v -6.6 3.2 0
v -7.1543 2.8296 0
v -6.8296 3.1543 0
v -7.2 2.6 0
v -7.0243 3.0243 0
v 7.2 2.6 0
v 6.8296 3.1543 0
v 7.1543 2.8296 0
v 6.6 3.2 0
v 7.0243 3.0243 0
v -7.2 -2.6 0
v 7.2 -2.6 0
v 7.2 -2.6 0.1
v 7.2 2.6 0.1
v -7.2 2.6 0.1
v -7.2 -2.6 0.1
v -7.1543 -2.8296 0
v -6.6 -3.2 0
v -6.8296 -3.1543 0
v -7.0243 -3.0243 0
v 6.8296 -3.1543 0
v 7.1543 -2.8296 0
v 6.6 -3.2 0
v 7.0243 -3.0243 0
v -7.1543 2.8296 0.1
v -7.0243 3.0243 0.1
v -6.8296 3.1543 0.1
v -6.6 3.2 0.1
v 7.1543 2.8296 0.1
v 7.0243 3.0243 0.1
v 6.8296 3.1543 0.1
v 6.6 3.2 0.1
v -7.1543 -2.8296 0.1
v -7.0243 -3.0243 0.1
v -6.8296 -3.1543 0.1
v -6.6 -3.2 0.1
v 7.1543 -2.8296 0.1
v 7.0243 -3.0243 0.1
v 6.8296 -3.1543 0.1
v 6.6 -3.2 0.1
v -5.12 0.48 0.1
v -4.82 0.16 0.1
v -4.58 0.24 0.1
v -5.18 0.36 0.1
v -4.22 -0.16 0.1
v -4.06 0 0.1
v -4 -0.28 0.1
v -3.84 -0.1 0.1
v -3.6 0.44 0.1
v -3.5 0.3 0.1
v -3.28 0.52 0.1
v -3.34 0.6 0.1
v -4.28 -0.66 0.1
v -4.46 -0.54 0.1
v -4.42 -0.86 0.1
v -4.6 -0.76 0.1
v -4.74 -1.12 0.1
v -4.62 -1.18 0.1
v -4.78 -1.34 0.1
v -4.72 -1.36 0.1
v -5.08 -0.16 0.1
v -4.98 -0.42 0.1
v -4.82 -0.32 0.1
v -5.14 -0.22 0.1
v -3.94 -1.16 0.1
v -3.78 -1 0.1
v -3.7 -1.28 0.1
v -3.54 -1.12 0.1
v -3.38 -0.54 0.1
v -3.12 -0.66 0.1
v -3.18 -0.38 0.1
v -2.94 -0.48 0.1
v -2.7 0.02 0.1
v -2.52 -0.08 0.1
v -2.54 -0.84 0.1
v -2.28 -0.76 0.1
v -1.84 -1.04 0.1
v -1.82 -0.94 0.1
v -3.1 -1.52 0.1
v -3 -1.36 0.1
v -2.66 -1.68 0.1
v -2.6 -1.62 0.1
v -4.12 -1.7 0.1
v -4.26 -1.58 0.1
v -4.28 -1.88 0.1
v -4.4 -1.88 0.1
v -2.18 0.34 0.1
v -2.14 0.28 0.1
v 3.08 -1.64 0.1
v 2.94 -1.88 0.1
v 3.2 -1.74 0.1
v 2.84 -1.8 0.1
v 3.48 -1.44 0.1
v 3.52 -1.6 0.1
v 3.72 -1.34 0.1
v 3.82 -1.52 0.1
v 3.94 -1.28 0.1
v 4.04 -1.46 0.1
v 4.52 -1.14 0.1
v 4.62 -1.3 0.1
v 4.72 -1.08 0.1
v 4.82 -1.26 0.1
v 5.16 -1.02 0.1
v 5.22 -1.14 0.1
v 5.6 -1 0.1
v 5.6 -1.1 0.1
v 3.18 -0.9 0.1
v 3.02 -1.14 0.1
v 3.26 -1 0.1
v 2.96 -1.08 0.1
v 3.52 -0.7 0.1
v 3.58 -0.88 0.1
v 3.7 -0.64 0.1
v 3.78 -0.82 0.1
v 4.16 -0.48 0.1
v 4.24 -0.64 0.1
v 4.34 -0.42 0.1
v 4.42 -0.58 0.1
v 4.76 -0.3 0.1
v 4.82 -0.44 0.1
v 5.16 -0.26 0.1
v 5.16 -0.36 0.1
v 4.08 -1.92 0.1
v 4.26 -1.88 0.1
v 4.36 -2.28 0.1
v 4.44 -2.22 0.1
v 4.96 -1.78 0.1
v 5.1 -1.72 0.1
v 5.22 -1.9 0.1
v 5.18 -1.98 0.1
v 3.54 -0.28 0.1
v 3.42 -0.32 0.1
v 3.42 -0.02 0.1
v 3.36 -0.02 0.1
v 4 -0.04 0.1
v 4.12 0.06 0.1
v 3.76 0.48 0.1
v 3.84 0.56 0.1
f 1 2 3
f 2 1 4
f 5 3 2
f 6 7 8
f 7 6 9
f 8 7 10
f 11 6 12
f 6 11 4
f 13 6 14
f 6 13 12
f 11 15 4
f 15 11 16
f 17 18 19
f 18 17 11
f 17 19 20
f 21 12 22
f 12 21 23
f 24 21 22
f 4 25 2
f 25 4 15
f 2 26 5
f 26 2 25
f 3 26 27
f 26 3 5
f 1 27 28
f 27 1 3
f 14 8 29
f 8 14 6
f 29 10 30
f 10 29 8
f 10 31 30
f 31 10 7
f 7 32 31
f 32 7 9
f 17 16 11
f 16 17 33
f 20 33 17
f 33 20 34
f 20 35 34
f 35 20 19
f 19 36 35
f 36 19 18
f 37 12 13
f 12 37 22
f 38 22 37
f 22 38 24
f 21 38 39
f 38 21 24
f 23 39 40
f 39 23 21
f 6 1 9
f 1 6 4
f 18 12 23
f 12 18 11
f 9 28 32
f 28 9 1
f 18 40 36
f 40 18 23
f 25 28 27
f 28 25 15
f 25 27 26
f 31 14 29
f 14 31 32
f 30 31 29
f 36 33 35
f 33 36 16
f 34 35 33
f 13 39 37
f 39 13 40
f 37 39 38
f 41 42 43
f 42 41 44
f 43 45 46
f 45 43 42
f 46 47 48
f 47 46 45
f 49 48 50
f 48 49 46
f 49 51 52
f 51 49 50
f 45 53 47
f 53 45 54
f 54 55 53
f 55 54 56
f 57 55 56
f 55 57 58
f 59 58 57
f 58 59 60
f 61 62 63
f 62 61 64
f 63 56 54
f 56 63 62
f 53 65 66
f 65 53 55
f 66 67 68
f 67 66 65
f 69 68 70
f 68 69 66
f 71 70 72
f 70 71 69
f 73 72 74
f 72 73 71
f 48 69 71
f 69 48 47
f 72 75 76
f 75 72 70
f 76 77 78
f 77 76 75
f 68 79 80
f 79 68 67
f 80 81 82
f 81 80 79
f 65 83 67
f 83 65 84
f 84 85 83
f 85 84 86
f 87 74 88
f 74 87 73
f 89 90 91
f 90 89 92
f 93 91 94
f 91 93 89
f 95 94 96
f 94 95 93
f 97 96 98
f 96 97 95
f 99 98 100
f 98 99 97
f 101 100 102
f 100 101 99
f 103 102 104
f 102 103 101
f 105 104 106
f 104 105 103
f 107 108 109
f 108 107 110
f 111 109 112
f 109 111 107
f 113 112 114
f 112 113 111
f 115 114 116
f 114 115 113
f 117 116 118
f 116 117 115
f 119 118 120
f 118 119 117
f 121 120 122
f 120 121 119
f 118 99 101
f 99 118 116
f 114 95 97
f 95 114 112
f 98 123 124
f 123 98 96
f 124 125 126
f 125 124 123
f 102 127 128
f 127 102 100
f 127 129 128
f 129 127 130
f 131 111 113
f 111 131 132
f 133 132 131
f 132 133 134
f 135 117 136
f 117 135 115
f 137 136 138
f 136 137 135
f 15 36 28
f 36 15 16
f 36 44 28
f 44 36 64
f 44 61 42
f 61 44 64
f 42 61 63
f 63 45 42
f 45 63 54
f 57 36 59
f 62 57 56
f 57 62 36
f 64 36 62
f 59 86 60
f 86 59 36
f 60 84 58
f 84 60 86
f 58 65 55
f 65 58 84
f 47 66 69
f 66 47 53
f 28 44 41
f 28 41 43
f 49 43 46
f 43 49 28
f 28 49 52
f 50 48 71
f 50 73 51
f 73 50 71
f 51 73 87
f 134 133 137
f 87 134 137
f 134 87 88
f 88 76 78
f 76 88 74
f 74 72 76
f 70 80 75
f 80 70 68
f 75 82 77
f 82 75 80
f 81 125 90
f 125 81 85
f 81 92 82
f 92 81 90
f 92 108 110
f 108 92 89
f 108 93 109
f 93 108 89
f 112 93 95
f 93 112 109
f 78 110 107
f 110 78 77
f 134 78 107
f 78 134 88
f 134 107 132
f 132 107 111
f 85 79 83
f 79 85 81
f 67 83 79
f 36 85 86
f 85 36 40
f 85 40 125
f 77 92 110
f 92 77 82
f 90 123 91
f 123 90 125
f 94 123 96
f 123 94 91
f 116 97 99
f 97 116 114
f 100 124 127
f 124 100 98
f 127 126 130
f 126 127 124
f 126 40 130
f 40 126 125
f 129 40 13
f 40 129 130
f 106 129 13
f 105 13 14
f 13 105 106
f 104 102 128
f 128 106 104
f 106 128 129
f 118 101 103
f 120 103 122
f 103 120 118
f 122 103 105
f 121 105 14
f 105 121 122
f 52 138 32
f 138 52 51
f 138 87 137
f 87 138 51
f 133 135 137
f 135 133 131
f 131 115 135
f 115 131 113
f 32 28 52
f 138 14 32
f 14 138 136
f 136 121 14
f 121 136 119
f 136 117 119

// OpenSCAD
// file: ../p/box3u12.scad
use <../lib.scad>
function ldraw_lib__box3u12() = [
// 0 Box with 3 Parallel Faces without Any Edges
// 0 Name: box3u12.dat
// 0 Author: J.C. Tchang [tchang]
// 0 !LDRAW_ORG Primitive UPDATE 2014-02
// 0 !LICENSE Licensed under CC BY 4.0 : see CAreadme.txt
// 
// 0 BFC CERTIFY CCW
  [0,"BFC","CERTIFY"],
  [0,"BFC","CCW"],
// 
// 0 !HISTORY 2014-12-23 [PTadmin] Official Update 2014-02
// 
// 
// 4 16 -1 1 1 1 1 1 1 1 -1 -1 1 -1
  [4,16,-1,1,1,1,1,1,1,1,-1,-1,1,-1],
// 4 16 -1 1 1 -1 0 1 1 0 1 1 1 1
  [4,16,-1,1,1,-1,0,1,1,0,1,1,1,1],
// 4 16 1 1 -1 1 0 -1 -1 0 -1 -1 1 -1
  [4,16,1,1,-1,1,0,-1,-1,0,-1,-1,1,-1],
];
module ldraw_lib__box3u12(step=0, col=false, unit=2/5, alt=false, line=0.2, solid=!$preview)
    makepoly(ldraw_lib__box3u12(), step=step, col=col, unit=unit, alt=alt, line=line, solid=solid);
ldraw_lib__box3u12(line=0.2);
// file: ../p/1-4cyli.scad
use <../lib.scad>
function ldraw_lib__1_4cyli() = [
// 0 Cylinder 0.25
// 0 Name: 1-4cyli.dat
// 0 Author: James Jessiman
// 0 !LDRAW_ORG Primitive UPDATE 2012-01
// 0 !LICENSE Licensed under CC BY 4.0 : see CAreadme.txt
// 
// 0 BFC CERTIFY CCW
  [0,"BFC","CERTIFY"],
  [0,"BFC","CCW"],
// 
// 0 !HISTORY 2002-03-23 [sbliss] Added BFC statement.
// 0 !HISTORY 2002-04-25 [PTadmin] Official Update 2002-02
// 0 !HISTORY 2007-06-22 [PTadmin] Header formatted for Contributor Agreement
// 0 !HISTORY 2008-07-01 [PTadmin] Official Update 2008-01
// 0 !HISTORY 2012-02-16 [Philo] Changed to CCW
// 0 !HISTORY 2012-03-30 [PTadmin] Official Update 2012-01
// 
// 
// 4 16 1 1 0 0.9239 1 0.3827 0.9239 0 0.3827 1 0 0
  [4,16,1,1,0,0.9239,1,0.3827,0.9239,0,0.3827,1,0,0],
// 5 24 1 0 0 1 1 0 0.9239 0 0.3827 1 0 -1
  [5,24,1,0,0,1,1,0,0.9239,0,0.3827,1,0,-1],
// 4 16 0.9239 1 0.3827 0.7071 1 0.7071 0.7071 0 0.7071 0.9239 0 0.3827
  [4,16,0.9239,1,0.3827,0.7071,1,0.7071,0.7071,0,0.7071,0.9239,0,0.3827],
// 5 24 0.9239 0 0.3827 0.9239 1 0.3827 0.7071 0 0.7071 1 0 0
  [5,24,0.9239,0,0.3827,0.9239,1,0.3827,0.7071,0,0.7071,1,0,0],
// 4 16 0.7071 1 0.7071 0.3827 1 0.9239 0.3827 0 0.9239 0.7071 0 0.7071
  [4,16,0.7071,1,0.7071,0.3827,1,0.9239,0.3827,0,0.9239,0.7071,0,0.7071],
// 5 24 0.7071 0 0.7071 0.7071 1 0.7071 0.3827 0 0.9239 0.9239 0 0.3827
  [5,24,0.7071,0,0.7071,0.7071,1,0.7071,0.3827,0,0.9239,0.9239,0,0.3827],
// 4 16 0.3827 1 0.9239 0 1 1 0 0 1 0.3827 0 0.9239
  [4,16,0.3827,1,0.9239,0,1,1,0,0,1,0.3827,0,0.9239],
// 5 24 0.3827 0 0.9239 0.3827 1 0.9239 0 0 1 0.7071 0 0.7071
  [5,24,0.3827,0,0.9239,0.3827,1,0.9239,0,0,1,0.7071,0,0.7071],
// 5 24 0 0 1 0 1 1 0.3827 0 0.9239 -1 0 1
  [5,24,0,0,1,0,1,1,0.3827,0,0.9239,-1,0,1],
];
module ldraw_lib__1_4cyli(step=0, col=false, unit=2/5, alt=false, line=0.2, solid=!$preview)
    makepoly(ldraw_lib__1_4cyli(), step=step, col=col, unit=unit, alt=alt, line=line, solid=solid);
ldraw_lib__1_4cyli(line=0.2);
// file: s/stickerback008x018.scad
use <../../lib.scad>
use <../../p/1-4chrd.scad>
use <../../p/1-4cyli.scad>
use <../../p/box3u12.scad>
function ldraw_lib__s__stickerback008x018() = [
// 0 ~Sticker Back  0.8 x  1.8
// 0 Name: s\stickerback008x018.dat
// 0 Author: Massimo Maso [Sirio]
// 0 !LDRAW_ORG Subpart UPDATE 2025-08
// 0 !LICENSE Licensed under CC BY 4.0 : see CAreadme.txt
// 
// 0 BFC CERTIFY CCW
  [0,"BFC","CERTIFY"],
  [0,"BFC","CCW"],
// 
// 0 !HISTORY 2025-08-31 [OrionP] Official Update 2025-08
// 
// 0 // Primitives
// 1 16 -16.5 0 6.5 -1.5 0 0 0 -1 0 0 0 1.5 1-4chrd.dat
  [1,16,-16.5,0,6.5,-1.5,0,0,0,-1,0,0,0,1.5, ldraw_lib__1_4chrd()],
// 1 16 16.5 0 6.5 1.5 0 0 0 -1 0 0 0 1.5 1-4chrd.dat
  [1,16,16.5,0,6.5,1.5,0,0,0,-1,0,0,0,1.5, ldraw_lib__1_4chrd()],
// 1 16 0 -.25 0 0 0 18 0 .25 0 6.5 0 0 box3u12.dat
  [1,16,0,-.25,0,0,0,18,0,.25,0,6.5,0,0, ldraw_lib__box3u12()],
// 1 16 -16.5 0 -6.5 -1.5 0 0 0 -1 0 0 0 -1.5 1-4chrd.dat
  [1,16,-16.5,0,-6.5,-1.5,0,0,0,-1,0,0,0,-1.5, ldraw_lib__1_4chrd()],
// 1 16 16.5 0 -6.5 1.5 0 0 0 -1 0 0 0 -1.5 1-4chrd.dat
  [1,16,16.5,0,-6.5,1.5,0,0,0,-1,0,0,0,-1.5, ldraw_lib__1_4chrd()],
// 1 16 -16.5 0 6.5 -1.5 0 0 0 -.25 0 0 0 1.5 1-4cyli.dat
  [1,16,-16.5,0,6.5,-1.5,0,0,0,-.25,0,0,0,1.5, ldraw_lib__1_4cyli()],
// 1 16 16.5 0 6.5 1.5 0 0 0 -.25 0 0 0 1.5 1-4cyli.dat
  [1,16,16.5,0,6.5,1.5,0,0,0,-.25,0,0,0,1.5, ldraw_lib__1_4cyli()],
// 1 16 -16.5 0 -6.5 -1.5 0 0 0 -.25 0 0 0 -1.5 1-4cyli.dat
  [1,16,-16.5,0,-6.5,-1.5,0,0,0,-.25,0,0,0,-1.5, ldraw_lib__1_4cyli()],
// 1 16 16.5 0 -6.5 1.5 0 0 0 -.25 0 0 0 -1.5 1-4cyli.dat
  [1,16,16.5,0,-6.5,1.5,0,0,0,-.25,0,0,0,-1.5, ldraw_lib__1_4cyli()],
// 0 // Bottom face
// 4 16 -18 0 6.5 -16.5 0 8 16.5 0 8 18 0 6.5
  [4,16,-18,0,6.5,-16.5,0,8,16.5,0,8,18,0,6.5],
// 4 16 -18 0 -6.5 18 0 -6.5 16.5 0 -8 -16.5 0 -8
  [4,16,-18,0,-6.5,18,0,-6.5,16.5,0,-8,-16.5,0,-8],
// 0 // Lateral face
// 4 16 -16.5 0 8 -16.5 -.25 8 16.5 -.25 8 16.5 0 8
  [4,16,-16.5,0,8,-16.5,-.25,8,16.5,-.25,8,16.5,0,8],
// 4 16 -16.5 0 -8 16.5 0 -8 16.5 -.25 -8 -16.5 -.25 -8
  [4,16,-16.5,0,-8,16.5,0,-8,16.5,-.25,-8,-16.5,-.25,-8],
];
module ldraw_lib__s__stickerback008x018(step=0, col=false, unit=2/5, alt=false, line=0.2, solid=!$preview)
    makepoly(ldraw_lib__s__stickerback008x018(), step=step, col=col, unit=unit, alt=alt, line=line, solid=solid);
ldraw_lib__s__stickerback008x018(line=0.2);
// file: ../p/1-4chrd.scad
use <../lib.scad>
function ldraw_lib__1_4chrd() = [
// 0 Chord 0.25
// 0 Name: 1-4chrd.dat
// 0 Author: Max Martin Richter [MMR1988]
// 0 !LDRAW_ORG Primitive UPDATE 2023-05
// 0 !LICENSE Licensed under CC BY 4.0 : see CAreadme.txt
// 
// 0 BFC CERTIFY CCW
  [0,"BFC","CERTIFY"],
  [0,"BFC","CCW"],
// 
// 0 !HISTORY 2004-04-22 [PTadmin] Official Update 2004-02
// 0 !HISTORY 2007-10-09 [PTadmin] Header formatted for Contributor Agreement
// 0 !HISTORY 2008-07-01 [PTadmin] Official Update 2008-01
// 0 !HISTORY 2012-08-02 [MMR1988] Re-creation with PrimGen2 and Rectifier
// 0 !HISTORY 2012-08-09 [PTadmin] Official Update 2012-02
// 0 !HISTORY 2023-10-27 [OrionP] Change author to MMR1988 from hafhead
// 0 !HISTORY 2023-10-31 [OrionP] Official Update 2023-05
// 
// 4 16 0.9239 0 0.3827 0.3827 0 0.9239 0 0 1 1 0 0
  [4,16,0.9239,0,0.3827,0.3827,0,0.9239,0,0,1,1,0,0],
// 3 16 0.7071 0 0.7071 0.3827 0 0.9239 0.9239 0 0.3827
  [3,16,0.7071,0,0.7071,0.3827,0,0.9239,0.9239,0,0.3827],
];
module ldraw_lib__1_4chrd(step=0, col=false, unit=2/5, alt=false, line=0.2, solid=!$preview)
    makepoly(ldraw_lib__1_4chrd(), step=step, col=col, unit=unit, alt=alt, line=line, solid=solid);
ldraw_lib__1_4chrd(line=0.2);
// main file
use <../lib.scad>
use <../p/1-4chrd.scad>
use <s/stickerback008x018.scad>
function ldraw_lib__6196575g() = [
// 0 Sticker  0.8 x  1.8 with Two Black Hashes on Tan Background
// 0 Name: 6196575g.dat
// 0 Author: Evert-Jan Boer [ejboer]
// 0 !LDRAW_ORG Part UPDATE 2026-09
// 0 !LICENSE Licensed under CC BY 4.0 : see CAreadme.txt
// 
// 0 BFC CERTIFY CCW
  [0,"BFC","CERTIFY"],
  [0,"BFC","CCW"],
// 
// 0 !CATEGORY Sticker
// 0 !KEYWORDS Bricklink 10258stk01, Brickowl 992817, London Bus, Rebrickable 34561
// 0 !KEYWORDS set 10258
// 
// 0 !HISTORY 2024-09-30 [OrionP] Official Update 2024-08
// 0 !HISTORY 2026-06-07 [Sirio] Introduced stickerback; changed description; adapted top face
// 0 !HISTORY 2026-09-30 [OrionP] Official Update 2026-09
// 
// 0 // Stickerback
// 1 16 0 0 0 1 0 0 0 1 0 0 0 1 s\stickerback008x018.dat
  [1,16,0,0,0,1,0,0,0,1,0,0,0,1, ldraw_lib__s__stickerback008x018()],
// 0 // Primitives
// 1 19 -16.5 -.25 6.5 -1.5 0 0 0 1 0 0 0 1.5 1-4chrd.dat
  [1,19,-16.5,-.25,6.5,-1.5,0,0,0,1,0,0,0,1.5, ldraw_lib__1_4chrd()],
// 1 19 16.5 -.25 6.5 1.5 0 0 0 1 0 0 0 1.5 1-4chrd.dat
  [1,19,16.5,-.25,6.5,1.5,0,0,0,1,0,0,0,1.5, ldraw_lib__1_4chrd()],
// 1 19 -16.5 -.25 -6.5 -1.5 0 0 0 1 0 0 0 -1.5 1-4chrd.dat
  [1,19,-16.5,-.25,-6.5,-1.5,0,0,0,1,0,0,0,-1.5, ldraw_lib__1_4chrd()],
// 1 19 16.5 -.25 -6.5 1.5 0 0 0 1 0 0 0 -1.5 1-4chrd.dat
  [1,19,16.5,-.25,-6.5,1.5,0,0,0,1,0,0,0,-1.5, ldraw_lib__1_4chrd()],
// 0 // Top face
// 0 // Black faces
// 4 0 -12.95 -.25 .9 -12.05 -.25 .4 -11.45 -.25 .6 -12.8 -.25 1.2
  [4,0,-12.95,-.25,.9,-12.05,-.25,.4,-11.45,-.25,.6,-12.8,-.25,1.2],
// 4 0 -12.05 -.25 .4 -10.55 -.25 -.4 -10.15 -.25 0 -11.45 -.25 .6
  [4,0,-12.05,-.25,.4,-10.55,-.25,-.4,-10.15,-.25,0,-11.45,-.25,.6],
// 4 0 -10.55 -.25 -.4 -10 -.25 -.7 -9.6 -.25 -.25 -10.15 -.25 0
  [4,0,-10.55,-.25,-.4,-10,-.25,-.7,-9.6,-.25,-.25,-10.15,-.25,0],
// 4 0 -10.15 -.25 0 -9.6 -.25 -.25 -8.75 -.25 .75 -9 -.25 1.1
  [4,0,-10.15,-.25,0,-9.6,-.25,-.25,-8.75,-.25,.75,-9,-.25,1.1],
// 4 0 -9 -.25 1.1 -8.75 -.25 .75 -8.2 -.25 1.3 -8.35 -.25 1.5
  [4,0,-9,-.25,1.1,-8.75,-.25,.75,-8.2,-.25,1.3,-8.35,-.25,1.5],
// 4 0 -10.7 -.25 -1.65 -10 -.25 -.7 -10.55 -.25 -.4 -11.15 -.25 -1.35
  [4,0,-10.7,-.25,-1.65,-10,-.25,-.7,-10.55,-.25,-.4,-11.15,-.25,-1.35],
// 4 0 -11.05 -.25 -2.15 -10.7 -.25 -1.65 -11.15 -.25 -1.35 -11.5 -.25 -1.9
  [4,0,-11.05,-.25,-2.15,-10.7,-.25,-1.65,-11.15,-.25,-1.35,-11.5,-.25,-1.9],
// 4 0 -11.55 -.25 -2.95 -11.05 -.25 -2.15 -11.5 -.25 -1.9 -11.85 -.25 -2.8
  [4,0,-11.55,-.25,-2.95,-11.05,-.25,-2.15,-11.5,-.25,-1.9,-11.85,-.25,-2.8],
// 4 0 -11.8 -.25 -3.4 -11.55 -.25 -2.95 -11.85 -.25 -2.8 -11.95 -.25 -3.35
  [4,0,-11.8,-.25,-3.4,-11.55,-.25,-2.95,-11.85,-.25,-2.8,-11.95,-.25,-3.35],
// 4 0 -12.7 -.25 -.4 -12.85 -.25 -.55 -12.45 -.25 -1.05 -12.05 -.25 -.8
  [4,0,-12.7,-.25,-.4,-12.85,-.25,-.55,-12.45,-.25,-1.05,-12.05,-.25,-.8],
// 4 0 -12.05 -.25 -.8 -12.45 -.25 -1.05 -11.5 -.25 -1.9 -11.15 -.25 -1.35
  [4,0,-12.05,-.25,-.8,-12.45,-.25,-1.05,-11.5,-.25,-1.9,-11.15,-.25,-1.35],
// 4 0 -11.05 -.25 -2.15 -9.85 -.25 -2.9 -9.45 -.25 -2.5 -10.7 -.25 -1.65
  [4,0,-11.05,-.25,-2.15,-9.85,-.25,-2.9,-9.45,-.25,-2.5,-10.7,-.25,-1.65],
// 4 0 -9.85 -.25 -2.9 -9.25 -.25 -3.2 -8.85 -.25 -2.8 -9.45 -.25 -2.5
  [4,0,-9.85,-.25,-2.9,-9.25,-.25,-3.2,-8.85,-.25,-2.8,-9.45,-.25,-2.5],
// 4 0 -9.45 -.25 -2.5 -8.85 -.25 -2.8 -7.8 -.25 -1.65 -8.45 -.25 -1.35
  [4,0,-9.45,-.25,-2.5,-8.85,-.25,-2.8,-7.8,-.25,-1.65,-8.45,-.25,-1.35],
// 4 0 -8.45 -.25 -1.35 -7.8 -.25 -1.65 -7.35 -.25 -1.2 -7.95 -.25 -.95
  [4,0,-8.45,-.25,-1.35,-7.8,-.25,-1.65,-7.35,-.25,-1.2,-7.95,-.25,-.95],
// 4 0 -6.3 -.25 -.2 -6.75 -.25 .05 -7.95 -.25 -.95 -7.35 -.25 -1.2
  [4,0,-6.3,-.25,-.2,-6.75,-.25,.05,-7.95,-.25,-.95,-7.35,-.25,-1.2],
// 4 0 -7.95 -.25 -.95 -9.6 -.25 -.25 -10 -.25 -.7 -8.45 -.25 -1.35
  [4,0,-7.95,-.25,-.95,-9.6,-.25,-.25,-10,-.25,-.7,-8.45,-.25,-1.35],
// 4 0 -5.7 -.25 -1.9 -7.35 -.25 -1.2 -7.8 -.25 -1.65 -6.35 -.25 -2.1
  [4,0,-5.7,-.25,-1.9,-7.35,-.25,-1.2,-7.8,-.25,-1.65,-6.35,-.25,-2.1],
// 4 0 -4.55 -.25 -2.35 -5.7 -.25 -1.9 -6.35 -.25 -2.1 -4.6 -.25 -2.6
  [4,0,-4.55,-.25,-2.35,-5.7,-.25,-1.9,-6.35,-.25,-2.1,-4.6,-.25,-2.6],
// 4 0 -8.85 -.25 -2.8 -9.25 -.25 -3.2 -7.75 -.25 -3.8 -7.5 -.25 -3.4
  [4,0,-8.85,-.25,-2.8,-9.25,-.25,-3.2,-7.75,-.25,-3.8,-7.5,-.25,-3.4],
// 4 0 -7.5 -.25 -3.4 -7.75 -.25 -3.8 -6.65 -.25 -4.2 -6.5 -.25 -4.05
  [4,0,-7.5,-.25,-3.4,-7.75,-.25,-3.8,-6.65,-.25,-4.2,-6.5,-.25,-4.05],
// 4 0 -9.85 -.25 -2.9 -10.65 -.25 -3.95 -10.3 -.25 -4.25 -9.25 -.25 -3.2
  [4,0,-9.85,-.25,-2.9,-10.65,-.25,-3.95,-10.3,-.25,-4.25,-9.25,-.25,-3.2],
// 4 0 -10.7 -.25 -4.7 -10.3 -.25 -4.25 -10.65 -.25 -3.95 -11 -.25 -4.7
  [4,0,-10.7,-.25,-4.7,-10.3,-.25,-4.25,-10.65,-.25,-3.95,-11,-.25,-4.7],
// 4 0 -6.75 -.25 .05 -6.3 -.25 -.2 -5.35 -.25 .7 -5.45 -.25 .85
  [4,0,-6.75,-.25,.05,-6.3,-.25,-.2,-5.35,-.25,.7,-5.45,-.25,.85],
// 4 0 7.1 -.25 -4.5 7.35 -.25 -4.7 8 -.25 -4.35 7.7 -.25 -4.1
  [4,0,7.1,-.25,-4.5,7.35,-.25,-4.7,8,-.25,-4.35,7.7,-.25,-4.1],
// 4 0 7.7 -.25 -4.1 8 -.25 -4.35 8.8 -.25 -4 8.7 -.25 -3.6
  [4,0,7.7,-.25,-4.1,8,-.25,-4.35,8.8,-.25,-4,8.7,-.25,-3.6],
// 4 0 8.7 -.25 -3.6 8.8 -.25 -4 9.55 -.25 -3.8 9.3 -.25 -3.35
  [4,0,8.7,-.25,-3.6,8.8,-.25,-4,9.55,-.25,-3.8,9.3,-.25,-3.35],
// 4 0 9.3 -.25 -3.35 9.55 -.25 -3.8 10.1 -.25 -3.65 9.85 -.25 -3.2
  [4,0,9.3,-.25,-3.35,9.55,-.25,-3.8,10.1,-.25,-3.65,9.85,-.25,-3.2],
// 4 0 9.85 -.25 -3.2 10.1 -.25 -3.65 11.55 -.25 -3.25 11.3 -.25 -2.85
  [4,0,9.85,-.25,-3.2,10.1,-.25,-3.65,11.55,-.25,-3.25,11.3,-.25,-2.85],
// 4 0 11.3 -.25 -2.85 11.55 -.25 -3.25 12.05 -.25 -3.15 11.8 -.25 -2.7
  [4,0,11.3,-.25,-2.85,11.55,-.25,-3.25,12.05,-.25,-3.15,11.8,-.25,-2.7],
// 4 0 13.05 -.25 -2.85 12.9 -.25 -2.55 11.8 -.25 -2.7 12.05 -.25 -3.15
  [4,0,13.05,-.25,-2.85,12.9,-.25,-2.55,11.8,-.25,-2.7,12.05,-.25,-3.15],
// 4 0 12.9 -.25 -2.55 13.05 -.25 -2.85 14 -.25 -2.75 14 -.25 -2.5
  [4,0,12.9,-.25,-2.55,13.05,-.25,-2.85,14,-.25,-2.75,14,-.25,-2.5],
// 4 0 7.4 -.25 -2.7 7.55 -.25 -2.85 8.15 -.25 -2.5 7.95 -.25 -2.25
  [4,0,7.4,-.25,-2.7,7.55,-.25,-2.85,8.15,-.25,-2.5,7.95,-.25,-2.25],
// 4 0 7.95 -.25 -2.25 8.15 -.25 -2.5 8.95 -.25 -2.2 8.8 -.25 -1.75
  [4,0,7.95,-.25,-2.25,8.15,-.25,-2.5,8.95,-.25,-2.2,8.8,-.25,-1.75],
// 4 0 8.8 -.25 -1.75 8.95 -.25 -2.2 9.45 -.25 -2.05 9.25 -.25 -1.6
  [4,0,8.8,-.25,-1.75,8.95,-.25,-2.2,9.45,-.25,-2.05,9.25,-.25,-1.6],
// 4 0 9.25 -.25 -1.6 9.45 -.25 -2.05 10.6 -.25 -1.6 10.4 -.25 -1.2
  [4,0,9.25,-.25,-1.6,9.45,-.25,-2.05,10.6,-.25,-1.6,10.4,-.25,-1.2],
// 4 0 10.4 -.25 -1.2 10.6 -.25 -1.6 11.05 -.25 -1.45 10.85 -.25 -1.05
  [4,0,10.4,-.25,-1.2,10.6,-.25,-1.6,11.05,-.25,-1.45,10.85,-.25,-1.05],
// 4 0 10.85 -.25 -1.05 11.05 -.25 -1.45 12.05 -.25 -1.1 11.9 -.25 -.75
  [4,0,10.85,-.25,-1.05,11.05,-.25,-1.45,12.05,-.25,-1.1,11.9,-.25,-.75],
// 4 0 12.9 -.25 -.9 12.9 -.25 -.65 11.9 -.25 -.75 12.05 -.25 -1.1
  [4,0,12.9,-.25,-.9,12.9,-.25,-.65,11.9,-.25,-.75,12.05,-.25,-1.1],
// 4 0 10.6 -.25 -1.6 11.3 -.25 -2.85 11.8 -.25 -2.7 11.05 -.25 -1.45
  [4,0,10.6,-.25,-1.6,11.3,-.25,-2.85,11.8,-.25,-2.7,11.05,-.25,-1.45],
// 4 0 8.95 -.25 -2.2 9.3 -.25 -3.35 9.85 -.25 -3.2 9.45 -.25 -2.05
  [4,0,8.95,-.25,-2.2,9.3,-.25,-3.35,9.85,-.25,-3.2,9.45,-.25,-2.05],
// 4 0 9.55 -.25 -3.8 10.2 -.25 -4.8 10.65 -.25 -4.7 10.1 -.25 -3.65
  [4,0,9.55,-.25,-3.8,10.2,-.25,-4.8,10.65,-.25,-4.7,10.1,-.25,-3.65],
// 4 0 10.2 -.25 -4.8 10.9 -.25 -5.7 11.1 -.25 -5.55 10.65 -.25 -4.7
  [4,0,10.2,-.25,-4.8,10.9,-.25,-5.7,11.1,-.25,-5.55,10.65,-.25,-4.7],
// 4 0 11.55 -.25 -3.25 12.4 -.25 -4.45 12.75 -.25 -4.3 12.05 -.25 -3.15
  [4,0,11.55,-.25,-3.25,12.4,-.25,-4.45,12.75,-.25,-4.3,12.05,-.25,-3.15],
// 4 0 12.4 -.25 -4.45 12.95 -.25 -4.95 13.05 -.25 -4.75 12.75 -.25 -4.3
  [4,0,12.4,-.25,-4.45,12.95,-.25,-4.95,13.05,-.25,-4.75,12.75,-.25,-4.3],
// 4 0 8.8 -.25 -1.75 9.25 -.25 -1.6 8.85 -.25 -.7 8.55 -.25 -.8
  [4,0,8.8,-.25,-1.75,9.25,-.25,-1.6,8.85,-.25,-.7,8.55,-.25,-.8],
// 4 0 8.55 -.25 -.8 8.85 -.25 -.7 8.55 -.25 -.05 8.4 -.25 -.05
  [4,0,8.55,-.25,-.8,8.85,-.25,-.7,8.55,-.25,-.05,8.4,-.25,-.05],
// 4 0 10.4 -.25 -1.2 10.85 -.25 -1.05 10.3 -.25 .15 10 -.25 -.1
  [4,0,10.4,-.25,-1.2,10.85,-.25,-1.05,10.3,-.25,.15,10,-.25,-.1],
// 4 0 10 -.25 -.1 10.3 -.25 .15 9.6 -.25 1.4 9.4 -.25 1.2
  [4,0,10,-.25,-.1,10.3,-.25,.15,9.6,-.25,1.4,9.4,-.25,1.2],
// 0 // Tan faces
// 4 19 -18 -.25 6.5 -18 -.25 -6.5 -16.5 -.25 -8 -16.5 -.25 8
  [4,19,-18,-.25,6.5,-18,-.25,-6.5,-16.5,-.25,-8,-16.5,-.25,8],
// 4 19 -16.5 -.25 8 -16.5 -.25 -8 -12.85 -.25 -.55 -12.95 -.25 .9
  [4,19,-16.5,-.25,8,-16.5,-.25,-8,-12.85,-.25,-.55,-12.95,-.25,.9],
// 4 19 -12.85 -.25 -.55 -12.7 -.25 -.4 -12.05 -.25 .4 -12.95 -.25 .9
  [4,19,-12.85,-.25,-.55,-12.7,-.25,-.4,-12.05,-.25,.4,-12.95,-.25,.9],
// 3 19 -12.05 -.25 .4 -12.7 -.25 -.4 -12.05 -.25 -.8
  [3,19,-12.05,-.25,.4,-12.7,-.25,-.4,-12.05,-.25,-.8],
// 4 19 -12.05 -.25 .4 -12.05 -.25 -.8 -11.15 -.25 -1.35 -10.55 -.25 -.4
  [4,19,-12.05,-.25,.4,-12.05,-.25,-.8,-11.15,-.25,-1.35,-10.55,-.25,-.4],
// 3 19 -11.85 -.25 -2.8 -16.5 -.25 -8 -11.95 -.25 -3.35
  [3,19,-11.85,-.25,-2.8,-16.5,-.25,-8,-11.95,-.25,-3.35],
// 4 19 -11.5 -.25 -1.9 -12.45 -.25 -1.05 -16.5 -.25 -8 -11.85 -.25 -2.8
  [4,19,-11.5,-.25,-1.9,-12.45,-.25,-1.05,-16.5,-.25,-8,-11.85,-.25,-2.8],
// 3 19 -12.85 -.25 -.55 -16.5 -.25 -8 -12.45 -.25 -1.05
  [3,19,-12.85,-.25,-.55,-16.5,-.25,-8,-12.45,-.25,-1.05],
// 4 19 -11.95 -.25 -3.35 -16.5 -.25 -8 -11 -.25 -4.7 -11.8 -.25 -3.4
  [4,19,-11.95,-.25,-3.35,-16.5,-.25,-8,-11,-.25,-4.7,-11.8,-.25,-3.4],
// 4 19 -11 -.25 -4.7 -10.65 -.25 -3.95 -11.55 -.25 -2.95 -11.8 -.25 -3.4
  [4,19,-11,-.25,-4.7,-10.65,-.25,-3.95,-11.55,-.25,-2.95,-11.8,-.25,-3.4],
// 4 19 -10.65 -.25 -3.95 -9.85 -.25 -2.9 -11.05 -.25 -2.15 -11.55 -.25 -2.95
  [4,19,-10.65,-.25,-3.95,-9.85,-.25,-2.9,-11.05,-.25,-2.15,-11.55,-.25,-2.95],
// 4 19 -8.45 -.25 -1.35 -10 -.25 -.7 -10.7 -.25 -1.65 -9.45 -.25 -2.5
  [4,19,-8.45,-.25,-1.35,-10,-.25,-.7,-10.7,-.25,-1.65,-9.45,-.25,-2.5],
// 3 19 -16.5 -.25 8 -12.95 -.25 .9 -12.8 -.25 1.2
  [3,19,-16.5,-.25,8,-12.95,-.25,.9,-12.8,-.25,1.2],
// 3 19 -16.5 -.25 8 -12.8 -.25 1.2 -11.45 -.25 .6
  [3,19,-16.5,-.25,8,-12.8,-.25,1.2,-11.45,-.25,.6],
// 4 19 -16.5 -.25 8 -11.45 -.25 .6 -10.15 -.25 0 -9 -.25 1.1
  [4,19,-16.5,-.25,8,-11.45,-.25,.6,-10.15,-.25,0,-9,-.25,1.1],
// 3 19 -16.5 -.25 8 -9 -.25 1.1 -8.35 -.25 1.5
  [3,19,-16.5,-.25,8,-9,-.25,1.1,-8.35,-.25,1.5],
// 3 19 -8.75 -.25 .75 -9.6 -.25 -.25 -7.95 -.25 -.95
  [3,19,-8.75,-.25,.75,-9.6,-.25,-.25,-7.95,-.25,-.95],
// 4 19 -7.95 -.25 -.95 -6.75 -.25 .05 -8.2 -.25 1.3 -8.75 -.25 .75
  [4,19,-7.95,-.25,-.95,-6.75,-.25,.05,-8.2,-.25,1.3,-8.75,-.25,.75],
// 3 19 -8.2 -.25 1.3 -6.75 -.25 .05 -5.45 -.25 .85
  [3,19,-8.2,-.25,1.3,-6.75,-.25,.05,-5.45,-.25,.85],
// 3 19 8.4 -.25 -.05 8.55 -.25 -.05 9.4 -.25 1.2
  [3,19,8.4,-.25,-.05,8.55,-.25,-.05,9.4,-.25,1.2],
// 4 19 -5.35 -.25 .7 8.4 -.25 -.05 9.4 -.25 1.2 -5.45 -.25 .85
  [4,19,-5.35,-.25,.7,8.4,-.25,-.05,9.4,-.25,1.2,-5.45,-.25,.85],
// 4 19 -4.55 -.25 -2.35 -5.35 -.25 .7 -6.3 -.25 -.2 -5.7 -.25 -1.9
  [4,19,-4.55,-.25,-2.35,-5.35,-.25,.7,-6.3,-.25,-.2,-5.7,-.25,-1.9],
// 3 19 -6.3 -.25 -.2 -7.35 -.25 -1.2 -5.7 -.25 -1.9
  [3,19,-6.3,-.25,-.2,-7.35,-.25,-1.2,-5.7,-.25,-1.9],
// 4 19 -6.35 -.25 -2.1 -7.8 -.25 -1.65 -8.85 -.25 -2.8 -7.5 -.25 -3.4
  [4,19,-6.35,-.25,-2.1,-7.8,-.25,-1.65,-8.85,-.25,-2.8,-7.5,-.25,-3.4],
// 4 19 -4.6 -.25 -2.6 -6.35 -.25 -2.1 -7.5 -.25 -3.4 -6.5 -.25 -4.05
  [4,19,-4.6,-.25,-2.6,-6.35,-.25,-2.1,-7.5,-.25,-3.4,-6.5,-.25,-4.05],
// 4 19 7.35 -.25 -4.7 -6.65 -.25 -4.2 -10.7 -.25 -4.7 10.9 -.25 -5.7
  [4,19,7.35,-.25,-4.7,-6.65,-.25,-4.2,-10.7,-.25,-4.7,10.9,-.25,-5.7],
// 4 19 -6.65 -.25 -4.2 7.35 -.25 -4.7 7.1 -.25 -4.5 -6.5 -.25 -4.05
  [4,19,-6.65,-.25,-4.2,7.35,-.25,-4.7,7.1,-.25,-4.5,-6.5,-.25,-4.05],
// 4 19 7.4 -.25 -2.7 7.1 -.25 -4.5 7.7 -.25 -4.1 7.55 -.25 -2.85
  [4,19,7.4,-.25,-2.7,7.1,-.25,-4.5,7.7,-.25,-4.1,7.55,-.25,-2.85],
// 4 19 8.7 -.25 -3.6 8.15 -.25 -2.5 7.55 -.25 -2.85 7.7 -.25 -4.1
  [4,19,8.7,-.25,-3.6,8.15,-.25,-2.5,7.55,-.25,-2.85,7.7,-.25,-4.1],
// 4 19 9.3 -.25 -3.35 8.95 -.25 -2.2 8.15 -.25 -2.5 8.7 -.25 -3.6
  [4,19,9.3,-.25,-3.35,8.95,-.25,-2.2,8.15,-.25,-2.5,8.7,-.25,-3.6],
// 4 19 -4.6 -.25 -2.6 7.4 -.25 -2.7 7.95 -.25 -2.25 -4.55 -.25 -2.35
  [4,19,-4.6,-.25,-2.6,7.4,-.25,-2.7,7.95,-.25,-2.25,-4.55,-.25,-2.35],
// 4 19 -5.35 -.25 .7 -4.55 -.25 -2.35 7.95 -.25 -2.25 8.4 -.25 -.05
  [4,19,-5.35,-.25,.7,-4.55,-.25,-2.35,7.95,-.25,-2.25,8.4,-.25,-.05],
// 3 19 8.4 -.25 -.05 7.95 -.25 -2.25 8.55 -.25 -.8
  [3,19,8.4,-.25,-.05,7.95,-.25,-2.25,8.55,-.25,-.8],
// 3 19 8.55 -.25 -.8 7.95 -.25 -2.25 8.8 -.25 -1.75
  [3,19,8.55,-.25,-.8,7.95,-.25,-2.25,8.8,-.25,-1.75],
// 4 19 -10.7 -.25 -4.7 -6.65 -.25 -4.2 -7.75 -.25 -3.8 -10.3 -.25 -4.25
  [4,19,-10.7,-.25,-4.7,-6.65,-.25,-4.2,-7.75,-.25,-3.8,-10.3,-.25,-4.25],
// 3 19 -9.25 -.25 -3.2 -10.3 -.25 -4.25 -7.75 -.25 -3.8
  [3,19,-9.25,-.25,-3.2,-10.3,-.25,-4.25,-7.75,-.25,-3.8],
// 4 19 -11 -.25 -4.7 -16.5 -.25 -8 16.5 -.25 -8 -10.7 -.25 -4.7
  [4,19,-11,-.25,-4.7,-16.5,-.25,-8,16.5,-.25,-8,-10.7,-.25,-4.7],
// 3 19 -10.7 -.25 -4.7 16.5 -.25 -8 10.9 -.25 -5.7
  [3,19,-10.7,-.25,-4.7,16.5,-.25,-8,10.9,-.25,-5.7],
// 4 19 7.4 -.25 -2.7 -4.6 -.25 -2.6 -6.5 -.25 -4.05 7.1 -.25 -4.5
  [4,19,7.4,-.25,-2.7,-4.6,-.25,-2.6,-6.5,-.25,-4.05,7.1,-.25,-4.5],
// 4 19 10.9 -.25 -5.7 10.2 -.25 -4.8 8 -.25 -4.35 7.35 -.25 -4.7
  [4,19,10.9,-.25,-5.7,10.2,-.25,-4.8,8,-.25,-4.35,7.35,-.25,-4.7],
// 4 19 8 -.25 -4.35 10.2 -.25 -4.8 9.55 -.25 -3.8 8.8 -.25 -4
  [4,19,8,-.25,-4.35,10.2,-.25,-4.8,9.55,-.25,-3.8,8.8,-.25,-4],
// 4 19 9.45 -.25 -2.05 9.85 -.25 -3.2 11.3 -.25 -2.85 10.6 -.25 -1.6
  [4,19,9.45,-.25,-2.05,9.85,-.25,-3.2,11.3,-.25,-2.85,10.6,-.25,-1.6],
// 4 19 10.1 -.25 -3.65 10.65 -.25 -4.7 12.4 -.25 -4.45 11.55 -.25 -3.25
  [4,19,10.1,-.25,-3.65,10.65,-.25,-4.7,12.4,-.25,-4.45,11.55,-.25,-3.25],
// 4 19 12.95 -.25 -4.95 12.4 -.25 -4.45 10.65 -.25 -4.7 11.1 -.25 -5.55
  [4,19,12.95,-.25,-4.95,12.4,-.25,-4.45,10.65,-.25,-4.7,11.1,-.25,-5.55],
// 4 19 10.9 -.25 -5.7 16.5 -.25 -8 12.95 -.25 -4.95 11.1 -.25 -5.55
  [4,19,10.9,-.25,-5.7,16.5,-.25,-8,12.95,-.25,-4.95,11.1,-.25,-5.55],
// 4 19 16.5 -.25 -8 18 -.25 -6.5 13.05 -.25 -4.75 12.95 -.25 -4.95
  [4,19,16.5,-.25,-8,18,-.25,-6.5,13.05,-.25,-4.75,12.95,-.25,-4.95],
// 3 19 14 -.25 -2.75 13.05 -.25 -4.75 18 -.25 -6.5
  [3,19,14,-.25,-2.75,13.05,-.25,-4.75,18,-.25,-6.5],
// 4 19 18 -.25 6.5 14 -.25 -2.5 14 -.25 -2.75 18 -.25 -6.5
  [4,19,18,-.25,6.5,14,-.25,-2.5,14,-.25,-2.75,18,-.25,-6.5],
// 3 19 13.05 -.25 -2.85 12.05 -.25 -3.15 12.75 -.25 -4.3
  [3,19,13.05,-.25,-2.85,12.05,-.25,-3.15,12.75,-.25,-4.3],
// 4 19 13.05 -.25 -2.85 12.75 -.25 -4.3 13.05 -.25 -4.75 14 -.25 -2.75
  [4,19,13.05,-.25,-2.85,12.75,-.25,-4.3,13.05,-.25,-4.75,14,-.25,-2.75],
// 3 19 11.05 -.25 -1.45 11.8 -.25 -2.7 12.9 -.25 -2.55
  [3,19,11.05,-.25,-1.45,11.8,-.25,-2.7,12.9,-.25,-2.55],
// 4 19 11.05 -.25 -1.45 12.9 -.25 -2.55 12.9 -.25 -.9 12.05 -.25 -1.1
  [4,19,11.05,-.25,-1.45,12.9,-.25,-2.55,12.9,-.25,-.9,12.05,-.25,-1.1],
// 3 19 12.9 -.25 -.9 12.9 -.25 -2.55 14 -.25 -2.5
  [3,19,12.9,-.25,-.9,12.9,-.25,-2.55,14,-.25,-2.5],
// 4 19 12.9 -.25 -.9 14 -.25 -2.5 18 -.25 6.5 12.9 -.25 -.65
  [4,19,12.9,-.25,-.9,14,-.25,-2.5,18,-.25,6.5,12.9,-.25,-.65],
// 4 19 -8.2 -.25 1.3 9.6 -.25 1.4 16.5 -.25 8 -8.35 -.25 1.5
  [4,19,-8.2,-.25,1.3,9.6,-.25,1.4,16.5,-.25,8,-8.35,-.25,1.5],
// 4 19 -8.2 -.25 1.3 -5.45 -.25 .85 9.4 -.25 1.2 9.6 -.25 1.4
  [4,19,-8.2,-.25,1.3,-5.45,-.25,.85,9.4,-.25,1.2,9.6,-.25,1.4],
// 4 19 9.4 -.25 1.2 8.55 -.25 -.05 8.85 -.25 -.7 10 -.25 -.1
  [4,19,9.4,-.25,1.2,8.55,-.25,-.05,8.85,-.25,-.7,10,-.25,-.1],
// 4 19 10 -.25 -.1 8.85 -.25 -.7 9.25 -.25 -1.6 10.4 -.25 -1.2
  [4,19,10,-.25,-.1,8.85,-.25,-.7,9.25,-.25,-1.6,10.4,-.25,-1.2],
// 3 19 16.5 -.25 8 -16.5 -.25 8 -8.35 -.25 1.5
  [3,19,16.5,-.25,8,-16.5,-.25,8,-8.35,-.25,1.5],
// 4 19 16.5 -.25 8 9.6 -.25 1.4 10.3 -.25 .15 18 -.25 6.5
  [4,19,16.5,-.25,8,9.6,-.25,1.4,10.3,-.25,.15,18,-.25,6.5],
// 4 19 12.9 -.25 -.65 18 -.25 6.5 10.3 -.25 .15 11.9 -.25 -.75
  [4,19,12.9,-.25,-.65,18,-.25,6.5,10.3,-.25,.15,11.9,-.25,-.75],
// 3 19 10.3 -.25 .15 10.85 -.25 -1.05 11.9 -.25 -.75
  [3,19,10.3,-.25,.15,10.85,-.25,-1.05,11.9,-.25,-.75],
];
module ldraw_lib__6196575g(step=0, col=false, unit=2/5, alt=false, line=0.2, solid=!$preview)
    makepoly(ldraw_lib__6196575g(), step=step, col=col, unit=unit, alt=alt, line=line, solid=solid);
ldraw_lib__6196575g(line=0.2);
